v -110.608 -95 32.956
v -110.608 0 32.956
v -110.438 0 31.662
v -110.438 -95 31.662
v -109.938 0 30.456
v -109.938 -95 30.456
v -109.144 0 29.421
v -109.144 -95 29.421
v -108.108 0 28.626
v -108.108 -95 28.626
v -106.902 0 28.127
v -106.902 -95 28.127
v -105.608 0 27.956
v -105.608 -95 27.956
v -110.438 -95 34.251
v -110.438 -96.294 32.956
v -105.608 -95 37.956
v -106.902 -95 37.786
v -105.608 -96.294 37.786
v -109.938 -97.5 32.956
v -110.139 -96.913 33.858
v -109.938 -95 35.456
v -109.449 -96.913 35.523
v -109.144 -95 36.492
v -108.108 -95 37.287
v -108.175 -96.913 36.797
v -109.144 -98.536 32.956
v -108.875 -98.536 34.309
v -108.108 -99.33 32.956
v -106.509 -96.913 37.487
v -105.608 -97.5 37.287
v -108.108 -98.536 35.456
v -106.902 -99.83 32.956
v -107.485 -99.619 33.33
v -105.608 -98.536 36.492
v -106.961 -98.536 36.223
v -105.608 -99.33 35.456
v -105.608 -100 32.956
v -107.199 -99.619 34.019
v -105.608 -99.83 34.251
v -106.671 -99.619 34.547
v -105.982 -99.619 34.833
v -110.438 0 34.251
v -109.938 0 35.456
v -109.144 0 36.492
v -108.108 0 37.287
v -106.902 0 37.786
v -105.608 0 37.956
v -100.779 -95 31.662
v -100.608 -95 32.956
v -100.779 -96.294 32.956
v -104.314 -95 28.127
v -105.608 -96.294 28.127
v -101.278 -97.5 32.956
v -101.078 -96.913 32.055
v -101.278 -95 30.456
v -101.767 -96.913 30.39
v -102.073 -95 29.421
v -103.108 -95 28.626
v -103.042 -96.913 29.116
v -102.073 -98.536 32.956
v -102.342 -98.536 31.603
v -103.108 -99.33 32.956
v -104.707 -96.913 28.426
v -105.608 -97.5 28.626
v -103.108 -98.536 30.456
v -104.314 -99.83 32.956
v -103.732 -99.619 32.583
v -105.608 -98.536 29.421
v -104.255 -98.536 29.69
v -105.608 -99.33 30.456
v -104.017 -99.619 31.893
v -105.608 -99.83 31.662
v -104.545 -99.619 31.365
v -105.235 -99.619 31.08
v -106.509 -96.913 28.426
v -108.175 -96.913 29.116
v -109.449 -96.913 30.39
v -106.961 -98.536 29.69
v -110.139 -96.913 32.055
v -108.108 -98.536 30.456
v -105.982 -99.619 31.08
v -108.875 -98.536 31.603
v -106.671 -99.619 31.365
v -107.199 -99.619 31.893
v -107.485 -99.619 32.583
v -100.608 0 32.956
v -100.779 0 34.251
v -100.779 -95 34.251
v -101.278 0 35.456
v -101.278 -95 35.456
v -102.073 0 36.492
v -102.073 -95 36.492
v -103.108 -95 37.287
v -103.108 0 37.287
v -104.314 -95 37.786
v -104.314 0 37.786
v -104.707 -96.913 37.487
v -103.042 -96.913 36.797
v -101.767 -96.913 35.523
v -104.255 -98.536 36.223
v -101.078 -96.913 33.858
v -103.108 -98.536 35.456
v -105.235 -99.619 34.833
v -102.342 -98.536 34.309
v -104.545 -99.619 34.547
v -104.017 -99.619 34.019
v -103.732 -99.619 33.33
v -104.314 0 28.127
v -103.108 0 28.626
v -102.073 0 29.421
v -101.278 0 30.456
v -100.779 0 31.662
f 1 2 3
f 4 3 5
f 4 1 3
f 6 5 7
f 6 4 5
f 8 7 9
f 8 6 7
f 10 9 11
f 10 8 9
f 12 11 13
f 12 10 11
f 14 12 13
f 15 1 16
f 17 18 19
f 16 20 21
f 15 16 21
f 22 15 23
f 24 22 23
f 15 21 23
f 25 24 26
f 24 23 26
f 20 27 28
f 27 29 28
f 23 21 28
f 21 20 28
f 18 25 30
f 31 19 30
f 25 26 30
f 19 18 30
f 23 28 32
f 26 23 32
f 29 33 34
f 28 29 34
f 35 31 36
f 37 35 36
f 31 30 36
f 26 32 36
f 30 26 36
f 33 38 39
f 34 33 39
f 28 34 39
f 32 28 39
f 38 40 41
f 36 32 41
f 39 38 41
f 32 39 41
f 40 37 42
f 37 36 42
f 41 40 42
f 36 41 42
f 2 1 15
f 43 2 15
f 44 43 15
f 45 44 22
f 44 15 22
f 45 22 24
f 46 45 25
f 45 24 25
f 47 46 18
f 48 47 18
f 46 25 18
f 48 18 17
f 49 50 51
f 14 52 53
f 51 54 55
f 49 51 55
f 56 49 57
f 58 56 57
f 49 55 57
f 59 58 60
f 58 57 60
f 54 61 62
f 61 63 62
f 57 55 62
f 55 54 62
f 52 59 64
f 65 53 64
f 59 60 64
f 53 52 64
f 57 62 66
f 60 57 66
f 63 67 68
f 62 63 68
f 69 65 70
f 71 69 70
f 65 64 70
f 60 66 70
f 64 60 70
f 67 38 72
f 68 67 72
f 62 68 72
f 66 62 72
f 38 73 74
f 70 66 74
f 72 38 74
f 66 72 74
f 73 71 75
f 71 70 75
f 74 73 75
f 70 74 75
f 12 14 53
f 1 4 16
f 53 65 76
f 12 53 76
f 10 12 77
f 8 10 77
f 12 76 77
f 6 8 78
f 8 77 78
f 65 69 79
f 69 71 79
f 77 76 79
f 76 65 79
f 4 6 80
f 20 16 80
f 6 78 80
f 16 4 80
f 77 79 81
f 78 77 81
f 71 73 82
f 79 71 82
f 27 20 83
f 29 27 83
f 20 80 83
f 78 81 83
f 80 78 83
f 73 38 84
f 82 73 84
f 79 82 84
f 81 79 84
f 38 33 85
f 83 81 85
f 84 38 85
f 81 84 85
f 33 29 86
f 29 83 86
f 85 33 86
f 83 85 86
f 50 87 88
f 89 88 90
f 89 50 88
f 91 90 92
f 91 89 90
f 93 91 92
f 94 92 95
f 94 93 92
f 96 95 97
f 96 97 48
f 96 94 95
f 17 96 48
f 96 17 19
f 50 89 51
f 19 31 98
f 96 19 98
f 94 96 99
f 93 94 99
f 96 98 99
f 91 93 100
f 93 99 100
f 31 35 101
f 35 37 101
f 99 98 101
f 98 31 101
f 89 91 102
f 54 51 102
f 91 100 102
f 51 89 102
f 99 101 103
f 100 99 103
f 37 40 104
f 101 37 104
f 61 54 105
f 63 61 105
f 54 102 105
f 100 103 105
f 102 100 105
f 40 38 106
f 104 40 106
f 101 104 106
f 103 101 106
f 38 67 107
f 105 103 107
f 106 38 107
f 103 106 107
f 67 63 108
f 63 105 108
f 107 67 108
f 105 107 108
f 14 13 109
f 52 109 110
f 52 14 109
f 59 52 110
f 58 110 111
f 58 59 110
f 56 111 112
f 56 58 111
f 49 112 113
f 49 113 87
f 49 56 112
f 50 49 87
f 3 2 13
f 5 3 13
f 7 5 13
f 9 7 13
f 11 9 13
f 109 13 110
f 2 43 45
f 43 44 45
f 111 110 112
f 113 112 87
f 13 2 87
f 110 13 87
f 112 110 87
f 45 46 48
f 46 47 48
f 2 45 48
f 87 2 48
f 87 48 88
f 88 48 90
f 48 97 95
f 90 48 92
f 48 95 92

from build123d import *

# Parameters (mm, degrees)
F0_W     = 10
F0_H     = 10
F1_DEPTH = 100
F2_R     = 4.99999
F3_R     = 4.99999


# Not quite as in the source:
# - a fillet or chamfer is up to 0.001 mm smaller than in the source, because OpenCascade refuses the exact size


with BuildPart() as f1:
    # F0 (on Front) → F1 (new body)
    with BuildSketch(Plane.XZ):
        with Locations((-105.608215639, 32.9564241692)):
            Rectangle(F0_W, F0_H)
    extrude(amount=F1_DEPTH)

    # F2 (radius 5 in the source; OpenCascade refuses exactly that, so slightly less here)
    f2_edges = [f1.edges().sort_by_distance(p)[0] for p in [
        (-110.608216, -50, 37.956424),
        (-100.608216, -50, 37.956424),
        (-100.608216, -50, 27.956424),
        (-110.608216, -50, 27.956424),
    ]]
    fillet(f2_edges, radius=F2_R)

    # F3 (radius 5 in the source; OpenCascade refuses exactly that, so slightly less here)
    f3_edges = [f1.edges().sort_by_distance(p)[0] for p in [
        (-109.143752, -100, 36.491961),
    ]]
    fillet(f3_edges, radius=F3_R)


solid = f1.part
